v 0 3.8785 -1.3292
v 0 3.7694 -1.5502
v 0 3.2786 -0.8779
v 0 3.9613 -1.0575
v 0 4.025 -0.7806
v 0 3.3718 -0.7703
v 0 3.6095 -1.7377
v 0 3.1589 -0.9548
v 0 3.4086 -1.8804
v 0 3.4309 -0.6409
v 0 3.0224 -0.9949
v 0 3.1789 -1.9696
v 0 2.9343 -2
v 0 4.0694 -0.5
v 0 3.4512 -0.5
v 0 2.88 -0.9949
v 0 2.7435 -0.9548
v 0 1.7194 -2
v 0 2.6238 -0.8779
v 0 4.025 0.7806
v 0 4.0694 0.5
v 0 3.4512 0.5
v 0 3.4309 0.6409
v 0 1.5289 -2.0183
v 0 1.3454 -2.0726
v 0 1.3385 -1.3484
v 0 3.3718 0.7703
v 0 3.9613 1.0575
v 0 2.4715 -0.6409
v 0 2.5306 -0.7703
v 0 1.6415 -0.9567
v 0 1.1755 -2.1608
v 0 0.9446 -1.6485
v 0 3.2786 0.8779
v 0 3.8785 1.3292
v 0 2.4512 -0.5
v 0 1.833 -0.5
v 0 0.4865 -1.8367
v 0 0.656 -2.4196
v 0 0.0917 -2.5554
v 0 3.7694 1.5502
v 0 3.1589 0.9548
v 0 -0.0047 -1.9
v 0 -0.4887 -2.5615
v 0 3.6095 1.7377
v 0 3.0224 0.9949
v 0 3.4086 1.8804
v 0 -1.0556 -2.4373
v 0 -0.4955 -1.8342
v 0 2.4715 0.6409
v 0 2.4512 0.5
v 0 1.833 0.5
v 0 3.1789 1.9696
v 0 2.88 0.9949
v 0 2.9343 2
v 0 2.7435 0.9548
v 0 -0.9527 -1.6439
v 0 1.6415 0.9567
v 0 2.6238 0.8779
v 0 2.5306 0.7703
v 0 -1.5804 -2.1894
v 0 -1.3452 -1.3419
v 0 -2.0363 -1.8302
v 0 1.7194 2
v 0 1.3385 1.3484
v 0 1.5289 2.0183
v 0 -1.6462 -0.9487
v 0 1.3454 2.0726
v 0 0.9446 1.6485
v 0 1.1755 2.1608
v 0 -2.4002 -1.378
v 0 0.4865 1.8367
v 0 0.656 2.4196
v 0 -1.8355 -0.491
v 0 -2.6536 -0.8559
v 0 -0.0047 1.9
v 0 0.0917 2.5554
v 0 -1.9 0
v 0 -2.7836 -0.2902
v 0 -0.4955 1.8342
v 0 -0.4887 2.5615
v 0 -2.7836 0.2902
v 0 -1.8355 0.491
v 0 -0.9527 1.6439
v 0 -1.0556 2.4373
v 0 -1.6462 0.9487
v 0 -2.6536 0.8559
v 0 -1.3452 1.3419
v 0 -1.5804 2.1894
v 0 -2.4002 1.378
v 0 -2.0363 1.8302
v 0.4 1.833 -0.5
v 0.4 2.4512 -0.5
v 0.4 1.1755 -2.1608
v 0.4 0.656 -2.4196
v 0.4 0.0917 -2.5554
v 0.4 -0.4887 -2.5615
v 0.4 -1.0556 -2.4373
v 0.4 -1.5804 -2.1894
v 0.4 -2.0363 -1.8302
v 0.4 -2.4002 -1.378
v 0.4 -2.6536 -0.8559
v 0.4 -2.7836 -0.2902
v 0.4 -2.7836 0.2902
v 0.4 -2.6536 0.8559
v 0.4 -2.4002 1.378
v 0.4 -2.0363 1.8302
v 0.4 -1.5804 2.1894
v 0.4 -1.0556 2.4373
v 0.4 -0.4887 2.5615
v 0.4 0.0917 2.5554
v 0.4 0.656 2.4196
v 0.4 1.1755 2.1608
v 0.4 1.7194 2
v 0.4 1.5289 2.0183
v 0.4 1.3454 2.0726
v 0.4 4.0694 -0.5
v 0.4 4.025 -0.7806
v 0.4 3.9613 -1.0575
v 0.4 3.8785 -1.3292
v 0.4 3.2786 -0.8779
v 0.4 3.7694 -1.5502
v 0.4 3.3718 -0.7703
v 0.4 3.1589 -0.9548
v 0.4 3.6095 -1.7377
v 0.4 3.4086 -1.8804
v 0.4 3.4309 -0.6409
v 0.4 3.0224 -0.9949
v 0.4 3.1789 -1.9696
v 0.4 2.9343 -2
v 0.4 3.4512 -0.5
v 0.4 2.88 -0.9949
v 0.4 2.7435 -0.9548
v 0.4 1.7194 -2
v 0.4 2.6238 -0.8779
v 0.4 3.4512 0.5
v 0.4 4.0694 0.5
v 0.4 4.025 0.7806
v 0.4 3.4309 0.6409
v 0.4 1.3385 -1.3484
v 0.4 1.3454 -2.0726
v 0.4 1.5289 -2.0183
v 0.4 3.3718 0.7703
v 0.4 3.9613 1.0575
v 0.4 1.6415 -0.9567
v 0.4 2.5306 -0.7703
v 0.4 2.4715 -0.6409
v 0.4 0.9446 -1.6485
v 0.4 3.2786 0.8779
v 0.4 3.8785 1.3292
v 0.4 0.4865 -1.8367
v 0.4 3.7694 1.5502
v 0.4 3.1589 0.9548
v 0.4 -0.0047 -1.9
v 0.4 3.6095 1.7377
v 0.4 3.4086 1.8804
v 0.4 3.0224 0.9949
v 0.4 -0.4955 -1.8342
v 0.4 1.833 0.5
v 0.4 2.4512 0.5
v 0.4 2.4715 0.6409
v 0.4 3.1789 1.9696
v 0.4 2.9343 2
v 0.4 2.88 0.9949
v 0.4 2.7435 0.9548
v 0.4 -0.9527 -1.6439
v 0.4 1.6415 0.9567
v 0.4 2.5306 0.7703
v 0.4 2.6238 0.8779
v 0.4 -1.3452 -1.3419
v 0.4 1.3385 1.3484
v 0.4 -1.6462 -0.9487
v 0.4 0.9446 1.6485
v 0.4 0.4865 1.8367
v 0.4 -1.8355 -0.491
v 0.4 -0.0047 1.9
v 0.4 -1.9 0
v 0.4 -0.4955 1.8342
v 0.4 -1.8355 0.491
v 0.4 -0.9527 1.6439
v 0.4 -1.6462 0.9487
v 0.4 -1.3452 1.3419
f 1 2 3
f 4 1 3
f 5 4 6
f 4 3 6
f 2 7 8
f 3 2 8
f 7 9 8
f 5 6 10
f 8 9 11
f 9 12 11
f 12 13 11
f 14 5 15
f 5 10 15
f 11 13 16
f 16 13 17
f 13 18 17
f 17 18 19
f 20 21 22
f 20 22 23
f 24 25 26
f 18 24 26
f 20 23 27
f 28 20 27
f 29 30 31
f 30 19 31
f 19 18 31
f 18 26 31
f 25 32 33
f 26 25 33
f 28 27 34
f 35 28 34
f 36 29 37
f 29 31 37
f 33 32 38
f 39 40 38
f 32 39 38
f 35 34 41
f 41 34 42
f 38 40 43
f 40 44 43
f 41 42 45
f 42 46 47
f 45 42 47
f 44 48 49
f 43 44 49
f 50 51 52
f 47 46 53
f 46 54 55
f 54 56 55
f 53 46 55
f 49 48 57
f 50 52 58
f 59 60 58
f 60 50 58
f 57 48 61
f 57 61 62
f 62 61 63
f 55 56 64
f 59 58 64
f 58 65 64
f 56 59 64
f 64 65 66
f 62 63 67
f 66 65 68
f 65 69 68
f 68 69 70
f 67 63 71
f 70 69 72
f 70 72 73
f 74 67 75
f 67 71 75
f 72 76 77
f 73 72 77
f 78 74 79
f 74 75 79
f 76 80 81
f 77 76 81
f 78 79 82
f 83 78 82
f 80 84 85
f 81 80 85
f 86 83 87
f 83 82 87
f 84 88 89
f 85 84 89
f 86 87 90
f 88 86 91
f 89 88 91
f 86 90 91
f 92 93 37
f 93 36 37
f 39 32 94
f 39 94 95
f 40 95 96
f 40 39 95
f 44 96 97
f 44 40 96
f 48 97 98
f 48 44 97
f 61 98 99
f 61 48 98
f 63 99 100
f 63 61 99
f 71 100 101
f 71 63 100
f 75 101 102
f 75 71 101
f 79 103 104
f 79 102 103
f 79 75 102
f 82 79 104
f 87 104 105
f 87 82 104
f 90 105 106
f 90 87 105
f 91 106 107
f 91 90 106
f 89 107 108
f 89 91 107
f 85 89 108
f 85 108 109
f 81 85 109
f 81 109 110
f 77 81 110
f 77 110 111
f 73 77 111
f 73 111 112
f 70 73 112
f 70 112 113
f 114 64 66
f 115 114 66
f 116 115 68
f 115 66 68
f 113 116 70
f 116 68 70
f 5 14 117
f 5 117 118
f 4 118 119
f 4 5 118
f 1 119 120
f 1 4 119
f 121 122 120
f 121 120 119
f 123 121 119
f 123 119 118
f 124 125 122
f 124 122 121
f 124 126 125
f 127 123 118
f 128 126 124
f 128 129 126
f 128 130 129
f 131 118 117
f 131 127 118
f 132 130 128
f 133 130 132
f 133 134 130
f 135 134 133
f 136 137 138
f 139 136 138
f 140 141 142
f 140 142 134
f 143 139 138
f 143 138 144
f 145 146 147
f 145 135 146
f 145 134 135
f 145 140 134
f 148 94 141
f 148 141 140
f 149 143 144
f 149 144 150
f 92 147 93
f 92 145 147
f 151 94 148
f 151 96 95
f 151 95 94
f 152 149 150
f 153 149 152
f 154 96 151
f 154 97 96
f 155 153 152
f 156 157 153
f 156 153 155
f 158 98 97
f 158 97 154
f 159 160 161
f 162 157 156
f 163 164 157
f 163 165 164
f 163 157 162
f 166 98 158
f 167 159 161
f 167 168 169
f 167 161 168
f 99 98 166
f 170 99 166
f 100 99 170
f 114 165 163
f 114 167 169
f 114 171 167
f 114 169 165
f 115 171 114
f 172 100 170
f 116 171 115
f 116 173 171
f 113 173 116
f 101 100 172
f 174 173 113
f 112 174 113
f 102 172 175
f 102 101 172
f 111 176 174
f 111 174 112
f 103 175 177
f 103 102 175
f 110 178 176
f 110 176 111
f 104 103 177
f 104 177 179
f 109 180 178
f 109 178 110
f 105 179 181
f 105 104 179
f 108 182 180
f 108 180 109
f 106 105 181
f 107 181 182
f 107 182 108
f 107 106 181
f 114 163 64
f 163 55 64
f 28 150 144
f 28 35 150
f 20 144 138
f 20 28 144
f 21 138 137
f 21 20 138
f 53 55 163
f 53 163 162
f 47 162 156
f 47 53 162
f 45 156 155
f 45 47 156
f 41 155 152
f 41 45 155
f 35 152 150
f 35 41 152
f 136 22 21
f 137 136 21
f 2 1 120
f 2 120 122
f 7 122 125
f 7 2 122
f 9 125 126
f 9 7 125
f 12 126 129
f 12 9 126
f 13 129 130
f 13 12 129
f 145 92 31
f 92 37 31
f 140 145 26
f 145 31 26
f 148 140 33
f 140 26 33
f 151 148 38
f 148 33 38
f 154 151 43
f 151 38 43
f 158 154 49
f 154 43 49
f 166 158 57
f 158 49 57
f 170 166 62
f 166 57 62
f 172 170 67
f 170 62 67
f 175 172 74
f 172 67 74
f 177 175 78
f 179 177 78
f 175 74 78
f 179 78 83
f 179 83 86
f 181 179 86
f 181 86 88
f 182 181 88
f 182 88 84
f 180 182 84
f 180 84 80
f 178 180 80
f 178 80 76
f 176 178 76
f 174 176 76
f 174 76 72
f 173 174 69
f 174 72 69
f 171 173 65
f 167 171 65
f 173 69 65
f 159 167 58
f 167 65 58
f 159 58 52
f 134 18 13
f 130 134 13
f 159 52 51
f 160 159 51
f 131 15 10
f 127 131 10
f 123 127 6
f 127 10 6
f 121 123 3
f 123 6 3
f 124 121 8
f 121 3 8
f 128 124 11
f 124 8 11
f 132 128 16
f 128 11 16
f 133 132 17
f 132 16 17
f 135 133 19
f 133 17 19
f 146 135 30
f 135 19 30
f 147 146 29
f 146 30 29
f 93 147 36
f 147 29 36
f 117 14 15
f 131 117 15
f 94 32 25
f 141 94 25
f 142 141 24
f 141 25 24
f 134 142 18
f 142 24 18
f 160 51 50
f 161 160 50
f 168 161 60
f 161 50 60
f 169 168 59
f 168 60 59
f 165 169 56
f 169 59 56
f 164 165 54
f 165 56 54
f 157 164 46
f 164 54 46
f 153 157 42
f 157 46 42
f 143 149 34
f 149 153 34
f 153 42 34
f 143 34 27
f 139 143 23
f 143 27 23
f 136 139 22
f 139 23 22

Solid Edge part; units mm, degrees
sketch "Sketch1" plane through (0, 0, 0) normal (1, 0, 0) x (0, 1, 0)
  arc A0 (1.1755, 2.1608) -> (1.1755, -2.1608) centre (-0.225, 0) ccw
  arc A1 (1.1755, -2.1608) -> (1.7194, -2) centre (1.7194, -3) cw
  line L0 (1.7194, -2) -> (3.5791, -2)
  arc A2 (3.5791, -2) -> (4.0694, -0.5) centre (0, 0) ccw
  line L1 (4.0694, -0.5) -> (1.833, -0.5)
  arc A3 (1.833, -0.5) -> (1.833, 0.5) centre (0, 0) cw
  line L2 (1.833, 0.5) -> (4.0694, 0.5)
  arc A4 (4.0694, 0.5) -> (3.5791, 2) centre (0, 0) ccw
  line L3 (3.5791, 2) -> (1.7194, 2)
  arc A5 (1.7194, 2) -> (1.1755, 2.1608) centre (1.7194, 3) cw
extrude "Protrusion1" add sketch "Sketch1" along normal blind 0.4
sketch "Sketch2" plane through (0, 0, 0) normal (1, 0, 0) x (0, 1, 0)
  line L0 (4.8771, 2.1) -> (2.9343, 2.1)
  line L1 (2.9343, 2.1) -> (2.9343, 2)
  arc A0 (2.9343, 2) -> (3.8808, 1.3226) centre (2.9343, 1) cw
  arc A1 (3.8808, 1.3226) -> (4.0694, 0.5) centre (0, 0) cw
  line L2 (4.0694, 0.5) -> (4.0694, -0.5)
  arc A2 (4.0694, -0.5) -> (3.8808, -1.3226) centre (0, 0) cw
  arc A3 (3.8808, -1.3226) -> (2.9343, -2) centre (2.9343, -1) cw
  line L3 (2.9343, -2) -> (2.9343, -2.1)
  line L4 (2.9343, -2.1) -> (4.8771, -2.1)
  arc A4 (4.8771, -2.1) -> (4.8771, 2.1) centre (0, 0) ccw
extrude "Extrusionsausschnitt_1" cut sketch "Sketch2" along normal blind 0.4
sketch "Sketch3" plane through (0, 0, 0) normal (1, 0, 0) x (0, 1, 0)
  arc A0 (3.4512, 0.5) -> (2.4512, 0.5) centre (2.9512, 0.5) ccw
  line L0 (2.4512, 0.5) -> (2.4512, -0.5)
  arc A1 (2.4512, -0.5) -> (3.4512, -0.5) centre (2.9512, -0.5) ccw
  line L1 (3.4512, -0.5) -> (3.4512, 0.5)
extrude "Extrusionsausschnitt_2" cut sketch "Sketch3" along normal blind 0.4
properties part number "Retaining ring DIN 471 4x0.4 36000.004.001(High)"
